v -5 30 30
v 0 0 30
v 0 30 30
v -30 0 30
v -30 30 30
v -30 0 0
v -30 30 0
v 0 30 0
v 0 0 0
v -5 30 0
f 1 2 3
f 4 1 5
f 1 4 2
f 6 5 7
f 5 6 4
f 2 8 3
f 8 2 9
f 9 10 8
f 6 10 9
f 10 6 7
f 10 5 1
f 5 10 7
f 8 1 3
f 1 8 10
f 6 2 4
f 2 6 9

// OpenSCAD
rotate([0,-90,0]){
    difference(){
        cube([30, 30, 30]);
        translate([0,30,5]) {
            cube([30, 30, 30]);
        }
    }
}
